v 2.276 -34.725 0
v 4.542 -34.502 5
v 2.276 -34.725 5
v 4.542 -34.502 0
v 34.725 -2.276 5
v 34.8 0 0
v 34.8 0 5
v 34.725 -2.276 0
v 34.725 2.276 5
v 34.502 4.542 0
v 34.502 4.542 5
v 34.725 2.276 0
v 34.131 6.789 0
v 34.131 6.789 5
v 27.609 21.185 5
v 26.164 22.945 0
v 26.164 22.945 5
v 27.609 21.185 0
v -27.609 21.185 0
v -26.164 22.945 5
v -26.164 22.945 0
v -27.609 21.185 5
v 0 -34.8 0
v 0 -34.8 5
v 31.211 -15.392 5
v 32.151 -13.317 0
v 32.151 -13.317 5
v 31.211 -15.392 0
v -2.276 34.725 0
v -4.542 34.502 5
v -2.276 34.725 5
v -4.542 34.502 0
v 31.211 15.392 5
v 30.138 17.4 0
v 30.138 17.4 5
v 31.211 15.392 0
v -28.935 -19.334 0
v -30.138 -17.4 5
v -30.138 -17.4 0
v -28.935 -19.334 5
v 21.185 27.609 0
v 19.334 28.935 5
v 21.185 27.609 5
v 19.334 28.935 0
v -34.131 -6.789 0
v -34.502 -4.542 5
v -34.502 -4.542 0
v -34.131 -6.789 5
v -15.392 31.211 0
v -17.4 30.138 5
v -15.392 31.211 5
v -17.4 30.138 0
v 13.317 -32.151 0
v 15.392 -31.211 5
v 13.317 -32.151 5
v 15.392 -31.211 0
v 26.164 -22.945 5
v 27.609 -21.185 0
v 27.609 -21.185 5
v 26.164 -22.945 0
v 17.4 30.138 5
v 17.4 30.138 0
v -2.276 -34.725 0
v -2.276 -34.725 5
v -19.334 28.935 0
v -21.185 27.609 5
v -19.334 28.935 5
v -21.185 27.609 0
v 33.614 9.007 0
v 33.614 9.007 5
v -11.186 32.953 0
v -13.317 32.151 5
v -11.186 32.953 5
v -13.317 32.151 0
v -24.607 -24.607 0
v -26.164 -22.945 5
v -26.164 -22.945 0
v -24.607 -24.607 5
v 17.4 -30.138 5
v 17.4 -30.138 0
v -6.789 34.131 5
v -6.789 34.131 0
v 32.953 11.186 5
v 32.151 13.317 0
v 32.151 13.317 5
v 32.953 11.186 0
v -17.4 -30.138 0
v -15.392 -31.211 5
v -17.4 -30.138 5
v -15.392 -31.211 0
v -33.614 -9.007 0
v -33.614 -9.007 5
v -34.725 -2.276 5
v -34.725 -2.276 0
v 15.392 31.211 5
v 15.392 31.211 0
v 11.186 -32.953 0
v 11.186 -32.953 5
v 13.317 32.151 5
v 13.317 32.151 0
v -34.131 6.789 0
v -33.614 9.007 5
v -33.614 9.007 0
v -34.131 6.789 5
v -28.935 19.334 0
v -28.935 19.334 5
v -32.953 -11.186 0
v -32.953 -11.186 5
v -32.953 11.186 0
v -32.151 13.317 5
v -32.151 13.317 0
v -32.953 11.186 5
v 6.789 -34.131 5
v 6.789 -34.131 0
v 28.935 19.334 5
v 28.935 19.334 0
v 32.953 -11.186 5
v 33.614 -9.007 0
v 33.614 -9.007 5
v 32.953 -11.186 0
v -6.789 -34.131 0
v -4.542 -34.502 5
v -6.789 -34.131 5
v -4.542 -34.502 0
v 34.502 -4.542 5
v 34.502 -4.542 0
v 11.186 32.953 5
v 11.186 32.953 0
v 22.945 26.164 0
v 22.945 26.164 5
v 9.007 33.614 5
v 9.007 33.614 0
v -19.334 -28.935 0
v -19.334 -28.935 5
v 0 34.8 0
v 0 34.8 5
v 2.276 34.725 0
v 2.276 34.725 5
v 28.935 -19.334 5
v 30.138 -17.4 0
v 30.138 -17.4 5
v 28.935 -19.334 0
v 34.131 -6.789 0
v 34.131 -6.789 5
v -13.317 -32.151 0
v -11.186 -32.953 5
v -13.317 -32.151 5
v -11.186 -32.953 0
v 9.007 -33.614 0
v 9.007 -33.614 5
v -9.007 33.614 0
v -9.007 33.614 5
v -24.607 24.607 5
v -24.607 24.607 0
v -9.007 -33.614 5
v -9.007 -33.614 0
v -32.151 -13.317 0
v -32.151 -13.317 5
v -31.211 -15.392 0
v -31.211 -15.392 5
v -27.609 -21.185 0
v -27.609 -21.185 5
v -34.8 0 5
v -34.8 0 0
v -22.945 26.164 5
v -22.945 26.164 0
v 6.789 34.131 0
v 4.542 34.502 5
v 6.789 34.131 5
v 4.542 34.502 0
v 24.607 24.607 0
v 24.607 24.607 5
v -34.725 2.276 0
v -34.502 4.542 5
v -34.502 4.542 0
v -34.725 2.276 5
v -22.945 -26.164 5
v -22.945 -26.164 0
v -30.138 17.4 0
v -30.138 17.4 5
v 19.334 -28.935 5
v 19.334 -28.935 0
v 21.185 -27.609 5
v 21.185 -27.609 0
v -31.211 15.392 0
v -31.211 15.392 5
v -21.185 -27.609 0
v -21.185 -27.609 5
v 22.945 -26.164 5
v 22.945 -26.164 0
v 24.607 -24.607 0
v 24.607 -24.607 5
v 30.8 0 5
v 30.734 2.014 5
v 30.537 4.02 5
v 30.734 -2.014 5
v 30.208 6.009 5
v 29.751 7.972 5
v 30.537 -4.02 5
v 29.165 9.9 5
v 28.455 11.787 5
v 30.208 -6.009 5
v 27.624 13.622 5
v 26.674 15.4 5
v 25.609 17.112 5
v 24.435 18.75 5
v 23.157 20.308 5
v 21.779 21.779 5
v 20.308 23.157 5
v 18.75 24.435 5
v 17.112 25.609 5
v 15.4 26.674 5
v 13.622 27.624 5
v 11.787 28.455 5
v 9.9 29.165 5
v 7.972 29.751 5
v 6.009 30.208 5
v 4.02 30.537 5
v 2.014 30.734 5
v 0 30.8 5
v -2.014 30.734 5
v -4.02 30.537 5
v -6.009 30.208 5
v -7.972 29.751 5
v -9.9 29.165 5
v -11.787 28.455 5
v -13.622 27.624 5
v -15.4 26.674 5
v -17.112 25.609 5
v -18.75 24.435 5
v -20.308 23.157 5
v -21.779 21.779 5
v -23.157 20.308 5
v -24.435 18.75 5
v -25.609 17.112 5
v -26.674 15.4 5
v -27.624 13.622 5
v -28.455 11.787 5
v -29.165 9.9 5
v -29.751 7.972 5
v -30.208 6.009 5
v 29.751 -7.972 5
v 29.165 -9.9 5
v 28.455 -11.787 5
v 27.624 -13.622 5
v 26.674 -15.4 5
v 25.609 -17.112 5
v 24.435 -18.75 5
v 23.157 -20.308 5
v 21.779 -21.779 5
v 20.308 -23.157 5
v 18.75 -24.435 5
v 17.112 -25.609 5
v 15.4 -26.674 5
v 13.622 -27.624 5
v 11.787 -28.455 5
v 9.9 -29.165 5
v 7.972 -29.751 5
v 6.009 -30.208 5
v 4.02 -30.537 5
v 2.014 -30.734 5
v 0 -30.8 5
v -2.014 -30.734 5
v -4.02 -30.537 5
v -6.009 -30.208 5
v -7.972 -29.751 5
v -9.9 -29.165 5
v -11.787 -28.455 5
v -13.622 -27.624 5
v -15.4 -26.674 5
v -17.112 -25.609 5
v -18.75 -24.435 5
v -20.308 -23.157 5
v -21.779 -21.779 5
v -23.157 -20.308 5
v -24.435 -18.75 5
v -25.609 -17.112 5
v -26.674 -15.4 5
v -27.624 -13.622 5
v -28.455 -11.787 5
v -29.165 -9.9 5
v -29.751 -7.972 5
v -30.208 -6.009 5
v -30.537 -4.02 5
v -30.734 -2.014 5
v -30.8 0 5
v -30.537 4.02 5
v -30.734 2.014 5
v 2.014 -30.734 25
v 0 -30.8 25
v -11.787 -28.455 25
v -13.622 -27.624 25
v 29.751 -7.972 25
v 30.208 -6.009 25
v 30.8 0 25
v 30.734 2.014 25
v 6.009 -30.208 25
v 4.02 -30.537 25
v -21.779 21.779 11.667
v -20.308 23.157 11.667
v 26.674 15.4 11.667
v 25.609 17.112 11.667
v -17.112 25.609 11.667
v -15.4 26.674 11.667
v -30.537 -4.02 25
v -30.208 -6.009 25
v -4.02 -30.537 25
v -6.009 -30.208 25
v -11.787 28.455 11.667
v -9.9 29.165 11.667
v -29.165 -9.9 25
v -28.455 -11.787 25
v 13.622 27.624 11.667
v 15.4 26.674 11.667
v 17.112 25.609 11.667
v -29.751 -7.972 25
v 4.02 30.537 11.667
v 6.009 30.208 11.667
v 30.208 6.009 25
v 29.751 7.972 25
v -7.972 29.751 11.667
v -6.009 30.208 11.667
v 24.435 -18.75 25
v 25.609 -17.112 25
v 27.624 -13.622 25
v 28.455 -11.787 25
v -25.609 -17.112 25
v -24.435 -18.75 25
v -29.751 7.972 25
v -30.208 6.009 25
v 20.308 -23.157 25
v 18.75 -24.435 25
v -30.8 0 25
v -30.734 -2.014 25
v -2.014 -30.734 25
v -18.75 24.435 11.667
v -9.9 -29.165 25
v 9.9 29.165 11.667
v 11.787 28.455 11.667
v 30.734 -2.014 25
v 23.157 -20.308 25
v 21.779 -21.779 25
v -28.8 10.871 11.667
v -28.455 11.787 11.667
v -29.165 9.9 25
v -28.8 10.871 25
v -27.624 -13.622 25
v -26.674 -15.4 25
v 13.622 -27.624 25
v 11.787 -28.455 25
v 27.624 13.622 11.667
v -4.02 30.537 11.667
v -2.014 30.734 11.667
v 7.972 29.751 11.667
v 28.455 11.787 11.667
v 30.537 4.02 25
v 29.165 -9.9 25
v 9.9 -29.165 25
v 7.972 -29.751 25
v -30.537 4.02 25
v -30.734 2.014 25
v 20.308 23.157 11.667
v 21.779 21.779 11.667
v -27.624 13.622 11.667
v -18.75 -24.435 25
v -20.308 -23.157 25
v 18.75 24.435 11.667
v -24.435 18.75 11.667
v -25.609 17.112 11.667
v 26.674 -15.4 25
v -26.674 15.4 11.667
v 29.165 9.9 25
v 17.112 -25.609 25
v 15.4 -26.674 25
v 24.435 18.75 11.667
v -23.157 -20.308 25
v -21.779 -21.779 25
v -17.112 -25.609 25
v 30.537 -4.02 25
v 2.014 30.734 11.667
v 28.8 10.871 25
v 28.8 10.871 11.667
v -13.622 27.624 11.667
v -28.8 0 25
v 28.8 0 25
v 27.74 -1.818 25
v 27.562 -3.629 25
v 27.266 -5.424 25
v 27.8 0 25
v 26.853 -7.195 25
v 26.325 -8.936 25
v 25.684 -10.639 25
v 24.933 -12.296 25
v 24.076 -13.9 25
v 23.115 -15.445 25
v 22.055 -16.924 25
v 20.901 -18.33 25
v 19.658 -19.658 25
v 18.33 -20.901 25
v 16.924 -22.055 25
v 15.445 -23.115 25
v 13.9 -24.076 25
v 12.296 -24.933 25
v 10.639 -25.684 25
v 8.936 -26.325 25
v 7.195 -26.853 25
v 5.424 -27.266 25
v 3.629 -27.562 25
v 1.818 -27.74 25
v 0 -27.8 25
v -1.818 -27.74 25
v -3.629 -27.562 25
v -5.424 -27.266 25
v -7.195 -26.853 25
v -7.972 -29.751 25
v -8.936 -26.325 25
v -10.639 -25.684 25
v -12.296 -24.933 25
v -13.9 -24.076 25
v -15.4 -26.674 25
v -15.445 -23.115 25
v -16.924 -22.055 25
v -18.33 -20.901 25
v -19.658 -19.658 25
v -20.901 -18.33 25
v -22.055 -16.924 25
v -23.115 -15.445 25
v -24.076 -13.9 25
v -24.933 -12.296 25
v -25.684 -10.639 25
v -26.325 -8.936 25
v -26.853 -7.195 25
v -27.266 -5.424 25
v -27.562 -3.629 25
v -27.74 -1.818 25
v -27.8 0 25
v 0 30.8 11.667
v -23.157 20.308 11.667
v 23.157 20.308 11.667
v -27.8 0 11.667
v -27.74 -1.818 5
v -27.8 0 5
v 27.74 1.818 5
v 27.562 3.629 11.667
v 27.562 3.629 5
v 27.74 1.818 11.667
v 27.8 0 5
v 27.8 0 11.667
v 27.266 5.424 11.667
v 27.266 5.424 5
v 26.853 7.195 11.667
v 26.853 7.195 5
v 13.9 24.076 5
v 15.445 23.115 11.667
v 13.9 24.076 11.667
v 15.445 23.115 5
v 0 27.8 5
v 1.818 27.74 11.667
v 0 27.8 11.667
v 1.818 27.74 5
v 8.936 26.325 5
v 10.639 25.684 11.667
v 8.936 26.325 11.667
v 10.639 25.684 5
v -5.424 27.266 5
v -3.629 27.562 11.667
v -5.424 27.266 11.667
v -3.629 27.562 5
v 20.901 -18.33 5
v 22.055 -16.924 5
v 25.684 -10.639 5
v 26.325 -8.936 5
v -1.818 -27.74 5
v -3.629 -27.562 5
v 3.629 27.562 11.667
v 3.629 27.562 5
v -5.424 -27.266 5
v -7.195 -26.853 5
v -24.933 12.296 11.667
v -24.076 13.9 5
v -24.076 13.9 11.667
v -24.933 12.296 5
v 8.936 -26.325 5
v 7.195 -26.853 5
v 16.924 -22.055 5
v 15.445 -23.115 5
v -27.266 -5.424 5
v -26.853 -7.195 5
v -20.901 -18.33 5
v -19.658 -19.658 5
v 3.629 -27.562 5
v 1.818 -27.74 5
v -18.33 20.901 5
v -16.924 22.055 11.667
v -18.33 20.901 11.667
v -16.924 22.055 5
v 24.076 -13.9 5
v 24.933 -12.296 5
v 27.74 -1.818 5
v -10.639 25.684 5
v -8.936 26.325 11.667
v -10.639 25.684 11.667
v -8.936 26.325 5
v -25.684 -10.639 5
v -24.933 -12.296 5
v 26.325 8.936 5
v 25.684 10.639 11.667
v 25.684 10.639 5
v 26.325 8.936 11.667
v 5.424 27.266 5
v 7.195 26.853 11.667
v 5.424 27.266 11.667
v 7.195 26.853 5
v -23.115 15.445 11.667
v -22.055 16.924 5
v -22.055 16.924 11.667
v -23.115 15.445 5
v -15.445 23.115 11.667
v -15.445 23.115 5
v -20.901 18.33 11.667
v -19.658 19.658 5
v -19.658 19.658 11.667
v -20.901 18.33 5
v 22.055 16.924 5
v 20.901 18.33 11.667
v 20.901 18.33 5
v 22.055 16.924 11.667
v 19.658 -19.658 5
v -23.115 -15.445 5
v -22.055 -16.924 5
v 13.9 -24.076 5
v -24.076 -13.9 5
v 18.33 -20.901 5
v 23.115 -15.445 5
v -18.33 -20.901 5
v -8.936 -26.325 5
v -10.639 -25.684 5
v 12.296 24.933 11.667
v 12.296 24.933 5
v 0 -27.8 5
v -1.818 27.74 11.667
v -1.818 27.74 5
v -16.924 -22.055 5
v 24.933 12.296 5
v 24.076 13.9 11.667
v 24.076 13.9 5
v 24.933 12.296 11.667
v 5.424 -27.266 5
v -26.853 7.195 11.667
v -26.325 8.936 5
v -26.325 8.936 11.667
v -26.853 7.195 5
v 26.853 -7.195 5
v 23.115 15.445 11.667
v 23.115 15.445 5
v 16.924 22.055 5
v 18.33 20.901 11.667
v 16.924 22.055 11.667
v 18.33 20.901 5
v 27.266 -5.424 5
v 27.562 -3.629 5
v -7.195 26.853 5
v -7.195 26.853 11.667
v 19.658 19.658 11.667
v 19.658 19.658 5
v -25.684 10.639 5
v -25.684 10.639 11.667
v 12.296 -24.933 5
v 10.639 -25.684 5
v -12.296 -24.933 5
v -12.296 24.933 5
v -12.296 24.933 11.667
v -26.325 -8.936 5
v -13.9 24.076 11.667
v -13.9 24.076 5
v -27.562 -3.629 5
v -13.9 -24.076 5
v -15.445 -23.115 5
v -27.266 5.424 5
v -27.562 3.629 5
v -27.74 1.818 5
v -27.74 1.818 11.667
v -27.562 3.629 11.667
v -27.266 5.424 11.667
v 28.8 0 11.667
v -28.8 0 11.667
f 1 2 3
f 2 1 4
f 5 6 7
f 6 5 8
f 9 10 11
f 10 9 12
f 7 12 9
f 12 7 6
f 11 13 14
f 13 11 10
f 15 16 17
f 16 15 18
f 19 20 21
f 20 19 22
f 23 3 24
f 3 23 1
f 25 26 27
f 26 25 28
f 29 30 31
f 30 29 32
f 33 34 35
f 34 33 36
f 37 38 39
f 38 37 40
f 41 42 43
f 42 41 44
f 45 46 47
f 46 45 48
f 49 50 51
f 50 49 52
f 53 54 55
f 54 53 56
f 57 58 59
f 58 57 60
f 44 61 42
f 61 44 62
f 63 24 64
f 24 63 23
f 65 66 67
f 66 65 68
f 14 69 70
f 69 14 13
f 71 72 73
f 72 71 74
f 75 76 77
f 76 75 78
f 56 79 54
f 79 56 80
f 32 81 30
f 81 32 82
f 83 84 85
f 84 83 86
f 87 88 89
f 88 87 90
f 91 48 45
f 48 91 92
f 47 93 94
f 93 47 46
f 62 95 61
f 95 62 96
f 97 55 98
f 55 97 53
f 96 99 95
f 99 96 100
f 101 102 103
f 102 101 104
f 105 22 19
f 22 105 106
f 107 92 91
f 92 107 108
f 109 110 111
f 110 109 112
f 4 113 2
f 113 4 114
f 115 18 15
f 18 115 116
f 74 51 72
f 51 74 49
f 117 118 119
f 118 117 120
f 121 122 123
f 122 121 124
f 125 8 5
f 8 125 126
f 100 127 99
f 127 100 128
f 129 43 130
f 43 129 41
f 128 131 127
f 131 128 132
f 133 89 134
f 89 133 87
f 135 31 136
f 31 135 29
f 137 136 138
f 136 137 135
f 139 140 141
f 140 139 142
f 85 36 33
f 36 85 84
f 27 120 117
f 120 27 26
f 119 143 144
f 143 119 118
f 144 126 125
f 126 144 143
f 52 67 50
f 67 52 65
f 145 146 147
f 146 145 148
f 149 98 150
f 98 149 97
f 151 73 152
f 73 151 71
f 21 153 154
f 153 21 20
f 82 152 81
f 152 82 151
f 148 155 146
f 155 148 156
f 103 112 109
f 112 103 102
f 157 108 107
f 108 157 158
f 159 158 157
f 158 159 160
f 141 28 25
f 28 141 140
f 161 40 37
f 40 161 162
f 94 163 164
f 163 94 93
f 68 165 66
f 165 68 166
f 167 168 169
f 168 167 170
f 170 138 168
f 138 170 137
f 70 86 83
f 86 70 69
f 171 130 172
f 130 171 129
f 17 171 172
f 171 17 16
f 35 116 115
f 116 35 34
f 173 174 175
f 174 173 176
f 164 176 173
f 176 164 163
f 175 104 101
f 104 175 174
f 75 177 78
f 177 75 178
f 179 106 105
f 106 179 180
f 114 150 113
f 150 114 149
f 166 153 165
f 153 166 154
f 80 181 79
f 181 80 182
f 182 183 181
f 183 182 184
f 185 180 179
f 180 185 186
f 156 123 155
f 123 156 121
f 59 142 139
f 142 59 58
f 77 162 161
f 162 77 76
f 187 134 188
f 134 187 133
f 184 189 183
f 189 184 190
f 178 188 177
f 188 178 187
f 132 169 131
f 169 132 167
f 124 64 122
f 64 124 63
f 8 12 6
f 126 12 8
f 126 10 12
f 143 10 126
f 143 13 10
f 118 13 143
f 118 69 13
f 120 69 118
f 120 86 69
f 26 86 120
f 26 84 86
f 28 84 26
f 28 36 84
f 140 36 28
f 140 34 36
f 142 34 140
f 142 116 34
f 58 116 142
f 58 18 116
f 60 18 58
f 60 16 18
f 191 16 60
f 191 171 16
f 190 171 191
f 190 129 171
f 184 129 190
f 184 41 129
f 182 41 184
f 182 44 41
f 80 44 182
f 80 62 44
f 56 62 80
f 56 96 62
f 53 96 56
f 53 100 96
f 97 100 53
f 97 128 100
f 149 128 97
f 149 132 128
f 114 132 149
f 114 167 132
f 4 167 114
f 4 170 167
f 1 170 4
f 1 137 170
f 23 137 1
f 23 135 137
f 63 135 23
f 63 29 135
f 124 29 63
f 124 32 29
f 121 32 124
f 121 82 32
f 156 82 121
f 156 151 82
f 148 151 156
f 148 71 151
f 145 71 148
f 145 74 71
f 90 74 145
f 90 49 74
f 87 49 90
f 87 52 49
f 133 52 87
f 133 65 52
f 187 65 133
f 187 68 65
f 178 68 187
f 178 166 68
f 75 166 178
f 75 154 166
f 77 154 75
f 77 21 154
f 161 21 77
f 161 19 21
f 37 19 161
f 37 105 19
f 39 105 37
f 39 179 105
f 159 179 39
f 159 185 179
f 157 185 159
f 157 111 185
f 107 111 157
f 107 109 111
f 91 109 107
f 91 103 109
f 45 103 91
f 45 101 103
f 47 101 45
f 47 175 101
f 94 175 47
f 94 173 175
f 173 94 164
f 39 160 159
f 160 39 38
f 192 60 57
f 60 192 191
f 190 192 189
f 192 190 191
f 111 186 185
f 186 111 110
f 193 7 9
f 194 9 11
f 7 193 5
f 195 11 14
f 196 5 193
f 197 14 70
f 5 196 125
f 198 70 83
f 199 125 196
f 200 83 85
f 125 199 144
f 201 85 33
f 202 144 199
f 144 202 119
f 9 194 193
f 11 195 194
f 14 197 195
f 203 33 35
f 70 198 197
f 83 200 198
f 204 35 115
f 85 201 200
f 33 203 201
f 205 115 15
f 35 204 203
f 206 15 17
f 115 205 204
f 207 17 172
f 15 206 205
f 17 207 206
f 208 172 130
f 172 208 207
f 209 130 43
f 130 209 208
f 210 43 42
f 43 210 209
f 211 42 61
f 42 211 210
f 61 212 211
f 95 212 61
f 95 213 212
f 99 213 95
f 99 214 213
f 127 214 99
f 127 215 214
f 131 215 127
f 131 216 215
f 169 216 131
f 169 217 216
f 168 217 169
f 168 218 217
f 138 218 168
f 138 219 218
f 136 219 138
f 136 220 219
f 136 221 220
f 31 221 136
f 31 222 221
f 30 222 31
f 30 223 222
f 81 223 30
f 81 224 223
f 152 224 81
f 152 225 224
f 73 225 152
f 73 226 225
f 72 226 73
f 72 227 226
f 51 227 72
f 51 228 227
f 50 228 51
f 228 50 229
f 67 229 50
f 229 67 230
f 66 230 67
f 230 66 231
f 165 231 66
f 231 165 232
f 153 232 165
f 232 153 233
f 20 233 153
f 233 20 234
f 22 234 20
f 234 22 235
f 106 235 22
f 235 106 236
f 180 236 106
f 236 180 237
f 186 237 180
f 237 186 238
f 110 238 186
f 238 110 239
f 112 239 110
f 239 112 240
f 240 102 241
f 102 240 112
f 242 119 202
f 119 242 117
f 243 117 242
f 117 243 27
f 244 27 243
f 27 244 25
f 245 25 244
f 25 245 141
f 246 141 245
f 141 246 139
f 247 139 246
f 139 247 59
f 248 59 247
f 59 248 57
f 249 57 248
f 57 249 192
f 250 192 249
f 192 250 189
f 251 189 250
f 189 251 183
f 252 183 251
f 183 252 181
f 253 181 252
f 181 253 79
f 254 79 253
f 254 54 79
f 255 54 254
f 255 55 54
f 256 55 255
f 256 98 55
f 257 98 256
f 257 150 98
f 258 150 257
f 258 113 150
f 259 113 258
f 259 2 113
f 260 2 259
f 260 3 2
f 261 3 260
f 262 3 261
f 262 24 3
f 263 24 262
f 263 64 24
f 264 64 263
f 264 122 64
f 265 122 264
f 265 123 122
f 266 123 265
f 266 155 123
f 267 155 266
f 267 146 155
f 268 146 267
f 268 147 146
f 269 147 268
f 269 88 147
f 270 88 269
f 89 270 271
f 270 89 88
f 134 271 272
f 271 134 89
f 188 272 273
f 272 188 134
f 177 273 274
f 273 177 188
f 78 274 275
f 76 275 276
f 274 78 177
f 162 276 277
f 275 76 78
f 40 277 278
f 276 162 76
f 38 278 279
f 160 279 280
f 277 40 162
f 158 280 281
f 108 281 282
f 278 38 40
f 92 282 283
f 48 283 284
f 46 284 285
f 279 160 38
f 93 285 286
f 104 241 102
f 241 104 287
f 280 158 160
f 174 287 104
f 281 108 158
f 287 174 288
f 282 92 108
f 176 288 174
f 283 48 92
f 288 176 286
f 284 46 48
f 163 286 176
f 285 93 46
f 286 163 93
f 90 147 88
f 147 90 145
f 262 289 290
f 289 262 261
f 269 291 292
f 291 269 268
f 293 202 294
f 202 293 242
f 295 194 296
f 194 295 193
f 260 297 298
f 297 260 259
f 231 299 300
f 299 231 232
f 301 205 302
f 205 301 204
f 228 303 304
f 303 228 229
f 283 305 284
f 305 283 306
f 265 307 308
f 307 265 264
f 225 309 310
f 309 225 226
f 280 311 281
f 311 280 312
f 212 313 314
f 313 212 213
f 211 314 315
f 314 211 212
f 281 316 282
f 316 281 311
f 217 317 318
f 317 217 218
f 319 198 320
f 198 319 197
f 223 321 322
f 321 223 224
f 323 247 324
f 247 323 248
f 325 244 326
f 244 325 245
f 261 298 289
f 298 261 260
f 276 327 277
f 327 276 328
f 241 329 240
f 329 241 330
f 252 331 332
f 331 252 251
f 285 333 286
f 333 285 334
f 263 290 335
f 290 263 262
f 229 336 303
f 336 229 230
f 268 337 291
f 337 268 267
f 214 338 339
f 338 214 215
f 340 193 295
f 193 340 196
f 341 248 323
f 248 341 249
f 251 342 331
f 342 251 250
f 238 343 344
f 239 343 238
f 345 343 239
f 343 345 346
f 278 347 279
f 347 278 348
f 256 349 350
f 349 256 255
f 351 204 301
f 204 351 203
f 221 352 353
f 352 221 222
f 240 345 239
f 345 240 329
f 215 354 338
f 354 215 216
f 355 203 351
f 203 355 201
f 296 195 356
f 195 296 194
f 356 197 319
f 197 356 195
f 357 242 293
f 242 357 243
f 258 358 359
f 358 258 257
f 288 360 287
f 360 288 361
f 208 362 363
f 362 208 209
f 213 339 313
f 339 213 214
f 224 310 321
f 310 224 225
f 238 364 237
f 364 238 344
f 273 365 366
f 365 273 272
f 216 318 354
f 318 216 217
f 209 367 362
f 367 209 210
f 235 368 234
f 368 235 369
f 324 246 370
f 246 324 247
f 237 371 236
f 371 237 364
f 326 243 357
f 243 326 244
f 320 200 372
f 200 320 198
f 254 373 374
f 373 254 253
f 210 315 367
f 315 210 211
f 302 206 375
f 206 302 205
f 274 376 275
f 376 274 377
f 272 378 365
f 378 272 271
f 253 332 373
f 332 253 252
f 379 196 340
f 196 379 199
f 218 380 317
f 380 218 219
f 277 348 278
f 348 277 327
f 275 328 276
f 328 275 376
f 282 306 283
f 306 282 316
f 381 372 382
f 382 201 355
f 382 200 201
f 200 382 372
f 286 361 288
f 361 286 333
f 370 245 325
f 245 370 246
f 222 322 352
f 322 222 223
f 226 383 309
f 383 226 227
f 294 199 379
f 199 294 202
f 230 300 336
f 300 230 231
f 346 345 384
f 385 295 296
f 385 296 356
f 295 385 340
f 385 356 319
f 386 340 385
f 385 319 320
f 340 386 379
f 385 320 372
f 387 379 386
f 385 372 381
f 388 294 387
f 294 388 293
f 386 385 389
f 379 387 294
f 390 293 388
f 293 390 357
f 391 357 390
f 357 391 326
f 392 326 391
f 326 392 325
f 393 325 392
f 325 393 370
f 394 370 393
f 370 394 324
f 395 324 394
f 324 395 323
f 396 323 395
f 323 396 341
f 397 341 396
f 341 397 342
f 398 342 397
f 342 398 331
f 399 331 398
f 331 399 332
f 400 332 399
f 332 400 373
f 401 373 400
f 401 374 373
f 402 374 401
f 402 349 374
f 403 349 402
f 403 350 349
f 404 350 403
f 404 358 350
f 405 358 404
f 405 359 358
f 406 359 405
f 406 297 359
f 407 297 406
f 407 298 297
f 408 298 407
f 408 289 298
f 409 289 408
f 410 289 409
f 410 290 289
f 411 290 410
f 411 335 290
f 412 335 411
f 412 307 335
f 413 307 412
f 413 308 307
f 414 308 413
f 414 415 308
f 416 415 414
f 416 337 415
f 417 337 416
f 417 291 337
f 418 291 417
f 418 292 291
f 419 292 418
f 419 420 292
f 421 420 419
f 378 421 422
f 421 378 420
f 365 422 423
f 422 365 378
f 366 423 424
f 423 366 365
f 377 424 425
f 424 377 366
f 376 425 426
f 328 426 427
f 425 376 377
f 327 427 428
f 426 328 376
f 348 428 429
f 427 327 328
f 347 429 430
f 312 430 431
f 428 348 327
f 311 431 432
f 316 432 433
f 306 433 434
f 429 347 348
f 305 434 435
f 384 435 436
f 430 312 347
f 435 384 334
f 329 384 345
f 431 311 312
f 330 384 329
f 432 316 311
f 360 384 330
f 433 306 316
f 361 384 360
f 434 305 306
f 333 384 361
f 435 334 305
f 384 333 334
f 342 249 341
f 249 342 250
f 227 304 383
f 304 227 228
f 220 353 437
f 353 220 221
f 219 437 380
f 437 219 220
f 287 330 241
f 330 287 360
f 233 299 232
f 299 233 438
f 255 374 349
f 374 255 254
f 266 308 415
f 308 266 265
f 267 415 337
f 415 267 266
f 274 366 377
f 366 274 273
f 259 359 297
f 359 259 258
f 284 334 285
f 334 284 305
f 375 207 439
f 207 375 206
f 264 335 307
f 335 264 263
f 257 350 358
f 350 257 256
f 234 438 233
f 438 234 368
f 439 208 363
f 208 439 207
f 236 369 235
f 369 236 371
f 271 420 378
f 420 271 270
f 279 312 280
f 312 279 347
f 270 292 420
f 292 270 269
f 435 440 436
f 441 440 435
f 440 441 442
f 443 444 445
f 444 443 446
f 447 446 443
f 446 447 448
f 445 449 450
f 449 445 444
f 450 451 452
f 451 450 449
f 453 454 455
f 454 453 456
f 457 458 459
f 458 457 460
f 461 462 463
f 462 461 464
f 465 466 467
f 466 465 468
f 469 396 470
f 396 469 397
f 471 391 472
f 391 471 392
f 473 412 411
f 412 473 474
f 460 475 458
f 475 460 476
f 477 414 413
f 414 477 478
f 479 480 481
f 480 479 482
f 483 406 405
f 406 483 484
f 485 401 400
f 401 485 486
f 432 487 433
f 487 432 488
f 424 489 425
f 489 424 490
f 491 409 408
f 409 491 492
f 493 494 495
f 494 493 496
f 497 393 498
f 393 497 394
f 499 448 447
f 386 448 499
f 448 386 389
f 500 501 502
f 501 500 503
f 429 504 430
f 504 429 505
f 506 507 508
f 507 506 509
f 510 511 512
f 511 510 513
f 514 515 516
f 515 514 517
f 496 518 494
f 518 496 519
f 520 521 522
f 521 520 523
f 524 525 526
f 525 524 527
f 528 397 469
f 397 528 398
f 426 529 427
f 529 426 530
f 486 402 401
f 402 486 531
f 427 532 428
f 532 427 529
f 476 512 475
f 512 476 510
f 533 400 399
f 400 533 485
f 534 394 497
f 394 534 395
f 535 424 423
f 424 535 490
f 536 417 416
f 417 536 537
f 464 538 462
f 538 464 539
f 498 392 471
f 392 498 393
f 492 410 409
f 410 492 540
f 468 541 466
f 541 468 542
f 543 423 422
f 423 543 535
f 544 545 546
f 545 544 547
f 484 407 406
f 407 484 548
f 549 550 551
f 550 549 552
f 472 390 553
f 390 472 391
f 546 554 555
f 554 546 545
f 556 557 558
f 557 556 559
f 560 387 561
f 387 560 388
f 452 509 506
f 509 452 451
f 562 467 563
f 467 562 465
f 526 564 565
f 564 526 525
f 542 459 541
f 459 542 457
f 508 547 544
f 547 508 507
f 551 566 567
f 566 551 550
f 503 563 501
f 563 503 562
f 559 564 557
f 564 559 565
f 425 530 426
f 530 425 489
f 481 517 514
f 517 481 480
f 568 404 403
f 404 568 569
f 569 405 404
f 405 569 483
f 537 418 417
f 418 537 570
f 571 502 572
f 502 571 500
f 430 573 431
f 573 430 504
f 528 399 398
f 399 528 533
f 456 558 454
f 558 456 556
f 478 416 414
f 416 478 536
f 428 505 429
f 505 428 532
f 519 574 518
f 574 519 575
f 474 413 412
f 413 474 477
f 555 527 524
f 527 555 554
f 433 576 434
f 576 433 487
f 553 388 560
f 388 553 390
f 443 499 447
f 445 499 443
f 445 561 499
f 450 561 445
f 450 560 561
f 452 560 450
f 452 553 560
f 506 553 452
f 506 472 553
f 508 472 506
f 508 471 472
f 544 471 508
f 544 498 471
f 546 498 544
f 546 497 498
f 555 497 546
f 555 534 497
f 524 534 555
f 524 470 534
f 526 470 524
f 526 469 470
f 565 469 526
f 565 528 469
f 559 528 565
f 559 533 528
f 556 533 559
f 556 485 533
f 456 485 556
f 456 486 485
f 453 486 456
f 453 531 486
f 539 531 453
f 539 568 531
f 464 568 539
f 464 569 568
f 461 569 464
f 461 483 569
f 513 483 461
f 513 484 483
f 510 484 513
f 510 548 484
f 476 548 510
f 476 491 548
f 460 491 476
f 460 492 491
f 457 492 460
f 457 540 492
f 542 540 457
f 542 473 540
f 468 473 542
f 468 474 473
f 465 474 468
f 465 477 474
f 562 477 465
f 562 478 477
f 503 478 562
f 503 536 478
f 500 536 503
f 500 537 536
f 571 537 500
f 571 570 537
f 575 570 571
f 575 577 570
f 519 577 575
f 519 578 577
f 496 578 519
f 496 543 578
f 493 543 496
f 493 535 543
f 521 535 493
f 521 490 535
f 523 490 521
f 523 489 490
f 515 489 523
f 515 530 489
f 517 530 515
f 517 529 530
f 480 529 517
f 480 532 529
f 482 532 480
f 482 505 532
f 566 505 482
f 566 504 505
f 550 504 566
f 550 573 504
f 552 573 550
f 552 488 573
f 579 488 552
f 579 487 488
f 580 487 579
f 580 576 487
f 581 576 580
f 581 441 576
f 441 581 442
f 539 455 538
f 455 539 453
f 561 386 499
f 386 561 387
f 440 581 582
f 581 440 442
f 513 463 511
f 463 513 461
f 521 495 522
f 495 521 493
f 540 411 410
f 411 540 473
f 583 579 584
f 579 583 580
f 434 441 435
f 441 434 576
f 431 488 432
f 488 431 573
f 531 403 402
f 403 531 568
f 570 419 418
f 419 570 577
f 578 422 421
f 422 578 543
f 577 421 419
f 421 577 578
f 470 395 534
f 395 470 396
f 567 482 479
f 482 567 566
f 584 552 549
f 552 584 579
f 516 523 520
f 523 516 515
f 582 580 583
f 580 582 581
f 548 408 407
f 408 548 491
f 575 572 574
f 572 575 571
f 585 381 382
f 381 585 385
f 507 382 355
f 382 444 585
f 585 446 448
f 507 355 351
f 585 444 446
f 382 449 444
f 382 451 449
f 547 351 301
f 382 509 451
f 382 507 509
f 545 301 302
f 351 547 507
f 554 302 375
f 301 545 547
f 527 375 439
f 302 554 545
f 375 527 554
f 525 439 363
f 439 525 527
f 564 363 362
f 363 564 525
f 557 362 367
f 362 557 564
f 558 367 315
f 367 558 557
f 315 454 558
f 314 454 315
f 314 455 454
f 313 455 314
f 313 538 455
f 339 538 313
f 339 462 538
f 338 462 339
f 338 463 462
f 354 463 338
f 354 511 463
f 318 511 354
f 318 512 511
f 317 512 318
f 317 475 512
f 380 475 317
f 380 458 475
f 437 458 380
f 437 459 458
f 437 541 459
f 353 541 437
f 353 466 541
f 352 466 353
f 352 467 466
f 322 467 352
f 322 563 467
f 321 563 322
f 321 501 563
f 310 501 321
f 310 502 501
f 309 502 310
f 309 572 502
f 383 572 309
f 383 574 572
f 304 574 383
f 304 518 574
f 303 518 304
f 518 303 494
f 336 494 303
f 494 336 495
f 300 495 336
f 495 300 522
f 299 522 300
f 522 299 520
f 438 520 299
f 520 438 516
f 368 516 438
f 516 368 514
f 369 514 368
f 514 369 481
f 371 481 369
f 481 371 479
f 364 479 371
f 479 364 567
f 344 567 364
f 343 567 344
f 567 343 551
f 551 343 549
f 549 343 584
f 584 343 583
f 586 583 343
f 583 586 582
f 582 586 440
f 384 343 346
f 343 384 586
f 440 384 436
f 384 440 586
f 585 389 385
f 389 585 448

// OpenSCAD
// Reagent bottle stand - a weighted base with a C-shaped wall that cradles a round
// reagent bottle upright on the bench, with an open front so the bottle slides in.
// A NOVEL part: deliberately not one of the 16 benchmark tasks.
//
// Parametric for augmentation. Ranges are the sane envelope a variant may be drawn from:
// @param bottle_d   outer diameter of the bottle to cradle, mm   [30:120]
// @param wall_h     height of the cradling wall, mm              [10:45]
// @param clearance  radial gap around the bottle, mm            [0.4:2.0]
// @param base_t     thickness of the base disk, mm              [3:10]
// @param wall_t     wall thickness, mm                          [2:5]
// @desc reagent bottle stand - an open-front cradle that holds a round reagent bottle upright
// @prompt Design a reagent bottle stand in OpenSCAD. It has a weighted circular base and a C-shaped wall that cradles a round bottle {bottle_d} mm in diameter upright on the bench; the wall is {wall_h} mm tall with an open front so the bottle slides in. Reply with a single complete OpenSCAD file.

bottle_d  = 54;   // e.g. a 100 mL round media bottle
wall_h    = 20;
clearance = 0.8;
base_t    = 5;
wall_t    = 3;

$fn = 96;

inner_r = bottle_d / 2 + clearance;
outer_r = inner_r + wall_t;
base_r  = outer_r + 4;              // the base overhangs the wall for tip stability

difference() {
    union() {
        cylinder(h = base_t, r = base_r);                 // base disk
        cylinder(h = base_t + wall_h, r = outer_r);       // cradling wall
    }
    translate([0, 0, base_t])
        cylinder(h = wall_h + 1, r = inner_r);            // pocket the bottle sits in
    // open the front: remove the +y half of the wall above the lower third,
    // leaving a C-shaped cradle the bottle slides into
    translate([-(inner_r + 1), 0, base_t + wall_h / 3])
        cube([2 * (inner_r + 1), base_r + 2, wall_h + 1]);
}
